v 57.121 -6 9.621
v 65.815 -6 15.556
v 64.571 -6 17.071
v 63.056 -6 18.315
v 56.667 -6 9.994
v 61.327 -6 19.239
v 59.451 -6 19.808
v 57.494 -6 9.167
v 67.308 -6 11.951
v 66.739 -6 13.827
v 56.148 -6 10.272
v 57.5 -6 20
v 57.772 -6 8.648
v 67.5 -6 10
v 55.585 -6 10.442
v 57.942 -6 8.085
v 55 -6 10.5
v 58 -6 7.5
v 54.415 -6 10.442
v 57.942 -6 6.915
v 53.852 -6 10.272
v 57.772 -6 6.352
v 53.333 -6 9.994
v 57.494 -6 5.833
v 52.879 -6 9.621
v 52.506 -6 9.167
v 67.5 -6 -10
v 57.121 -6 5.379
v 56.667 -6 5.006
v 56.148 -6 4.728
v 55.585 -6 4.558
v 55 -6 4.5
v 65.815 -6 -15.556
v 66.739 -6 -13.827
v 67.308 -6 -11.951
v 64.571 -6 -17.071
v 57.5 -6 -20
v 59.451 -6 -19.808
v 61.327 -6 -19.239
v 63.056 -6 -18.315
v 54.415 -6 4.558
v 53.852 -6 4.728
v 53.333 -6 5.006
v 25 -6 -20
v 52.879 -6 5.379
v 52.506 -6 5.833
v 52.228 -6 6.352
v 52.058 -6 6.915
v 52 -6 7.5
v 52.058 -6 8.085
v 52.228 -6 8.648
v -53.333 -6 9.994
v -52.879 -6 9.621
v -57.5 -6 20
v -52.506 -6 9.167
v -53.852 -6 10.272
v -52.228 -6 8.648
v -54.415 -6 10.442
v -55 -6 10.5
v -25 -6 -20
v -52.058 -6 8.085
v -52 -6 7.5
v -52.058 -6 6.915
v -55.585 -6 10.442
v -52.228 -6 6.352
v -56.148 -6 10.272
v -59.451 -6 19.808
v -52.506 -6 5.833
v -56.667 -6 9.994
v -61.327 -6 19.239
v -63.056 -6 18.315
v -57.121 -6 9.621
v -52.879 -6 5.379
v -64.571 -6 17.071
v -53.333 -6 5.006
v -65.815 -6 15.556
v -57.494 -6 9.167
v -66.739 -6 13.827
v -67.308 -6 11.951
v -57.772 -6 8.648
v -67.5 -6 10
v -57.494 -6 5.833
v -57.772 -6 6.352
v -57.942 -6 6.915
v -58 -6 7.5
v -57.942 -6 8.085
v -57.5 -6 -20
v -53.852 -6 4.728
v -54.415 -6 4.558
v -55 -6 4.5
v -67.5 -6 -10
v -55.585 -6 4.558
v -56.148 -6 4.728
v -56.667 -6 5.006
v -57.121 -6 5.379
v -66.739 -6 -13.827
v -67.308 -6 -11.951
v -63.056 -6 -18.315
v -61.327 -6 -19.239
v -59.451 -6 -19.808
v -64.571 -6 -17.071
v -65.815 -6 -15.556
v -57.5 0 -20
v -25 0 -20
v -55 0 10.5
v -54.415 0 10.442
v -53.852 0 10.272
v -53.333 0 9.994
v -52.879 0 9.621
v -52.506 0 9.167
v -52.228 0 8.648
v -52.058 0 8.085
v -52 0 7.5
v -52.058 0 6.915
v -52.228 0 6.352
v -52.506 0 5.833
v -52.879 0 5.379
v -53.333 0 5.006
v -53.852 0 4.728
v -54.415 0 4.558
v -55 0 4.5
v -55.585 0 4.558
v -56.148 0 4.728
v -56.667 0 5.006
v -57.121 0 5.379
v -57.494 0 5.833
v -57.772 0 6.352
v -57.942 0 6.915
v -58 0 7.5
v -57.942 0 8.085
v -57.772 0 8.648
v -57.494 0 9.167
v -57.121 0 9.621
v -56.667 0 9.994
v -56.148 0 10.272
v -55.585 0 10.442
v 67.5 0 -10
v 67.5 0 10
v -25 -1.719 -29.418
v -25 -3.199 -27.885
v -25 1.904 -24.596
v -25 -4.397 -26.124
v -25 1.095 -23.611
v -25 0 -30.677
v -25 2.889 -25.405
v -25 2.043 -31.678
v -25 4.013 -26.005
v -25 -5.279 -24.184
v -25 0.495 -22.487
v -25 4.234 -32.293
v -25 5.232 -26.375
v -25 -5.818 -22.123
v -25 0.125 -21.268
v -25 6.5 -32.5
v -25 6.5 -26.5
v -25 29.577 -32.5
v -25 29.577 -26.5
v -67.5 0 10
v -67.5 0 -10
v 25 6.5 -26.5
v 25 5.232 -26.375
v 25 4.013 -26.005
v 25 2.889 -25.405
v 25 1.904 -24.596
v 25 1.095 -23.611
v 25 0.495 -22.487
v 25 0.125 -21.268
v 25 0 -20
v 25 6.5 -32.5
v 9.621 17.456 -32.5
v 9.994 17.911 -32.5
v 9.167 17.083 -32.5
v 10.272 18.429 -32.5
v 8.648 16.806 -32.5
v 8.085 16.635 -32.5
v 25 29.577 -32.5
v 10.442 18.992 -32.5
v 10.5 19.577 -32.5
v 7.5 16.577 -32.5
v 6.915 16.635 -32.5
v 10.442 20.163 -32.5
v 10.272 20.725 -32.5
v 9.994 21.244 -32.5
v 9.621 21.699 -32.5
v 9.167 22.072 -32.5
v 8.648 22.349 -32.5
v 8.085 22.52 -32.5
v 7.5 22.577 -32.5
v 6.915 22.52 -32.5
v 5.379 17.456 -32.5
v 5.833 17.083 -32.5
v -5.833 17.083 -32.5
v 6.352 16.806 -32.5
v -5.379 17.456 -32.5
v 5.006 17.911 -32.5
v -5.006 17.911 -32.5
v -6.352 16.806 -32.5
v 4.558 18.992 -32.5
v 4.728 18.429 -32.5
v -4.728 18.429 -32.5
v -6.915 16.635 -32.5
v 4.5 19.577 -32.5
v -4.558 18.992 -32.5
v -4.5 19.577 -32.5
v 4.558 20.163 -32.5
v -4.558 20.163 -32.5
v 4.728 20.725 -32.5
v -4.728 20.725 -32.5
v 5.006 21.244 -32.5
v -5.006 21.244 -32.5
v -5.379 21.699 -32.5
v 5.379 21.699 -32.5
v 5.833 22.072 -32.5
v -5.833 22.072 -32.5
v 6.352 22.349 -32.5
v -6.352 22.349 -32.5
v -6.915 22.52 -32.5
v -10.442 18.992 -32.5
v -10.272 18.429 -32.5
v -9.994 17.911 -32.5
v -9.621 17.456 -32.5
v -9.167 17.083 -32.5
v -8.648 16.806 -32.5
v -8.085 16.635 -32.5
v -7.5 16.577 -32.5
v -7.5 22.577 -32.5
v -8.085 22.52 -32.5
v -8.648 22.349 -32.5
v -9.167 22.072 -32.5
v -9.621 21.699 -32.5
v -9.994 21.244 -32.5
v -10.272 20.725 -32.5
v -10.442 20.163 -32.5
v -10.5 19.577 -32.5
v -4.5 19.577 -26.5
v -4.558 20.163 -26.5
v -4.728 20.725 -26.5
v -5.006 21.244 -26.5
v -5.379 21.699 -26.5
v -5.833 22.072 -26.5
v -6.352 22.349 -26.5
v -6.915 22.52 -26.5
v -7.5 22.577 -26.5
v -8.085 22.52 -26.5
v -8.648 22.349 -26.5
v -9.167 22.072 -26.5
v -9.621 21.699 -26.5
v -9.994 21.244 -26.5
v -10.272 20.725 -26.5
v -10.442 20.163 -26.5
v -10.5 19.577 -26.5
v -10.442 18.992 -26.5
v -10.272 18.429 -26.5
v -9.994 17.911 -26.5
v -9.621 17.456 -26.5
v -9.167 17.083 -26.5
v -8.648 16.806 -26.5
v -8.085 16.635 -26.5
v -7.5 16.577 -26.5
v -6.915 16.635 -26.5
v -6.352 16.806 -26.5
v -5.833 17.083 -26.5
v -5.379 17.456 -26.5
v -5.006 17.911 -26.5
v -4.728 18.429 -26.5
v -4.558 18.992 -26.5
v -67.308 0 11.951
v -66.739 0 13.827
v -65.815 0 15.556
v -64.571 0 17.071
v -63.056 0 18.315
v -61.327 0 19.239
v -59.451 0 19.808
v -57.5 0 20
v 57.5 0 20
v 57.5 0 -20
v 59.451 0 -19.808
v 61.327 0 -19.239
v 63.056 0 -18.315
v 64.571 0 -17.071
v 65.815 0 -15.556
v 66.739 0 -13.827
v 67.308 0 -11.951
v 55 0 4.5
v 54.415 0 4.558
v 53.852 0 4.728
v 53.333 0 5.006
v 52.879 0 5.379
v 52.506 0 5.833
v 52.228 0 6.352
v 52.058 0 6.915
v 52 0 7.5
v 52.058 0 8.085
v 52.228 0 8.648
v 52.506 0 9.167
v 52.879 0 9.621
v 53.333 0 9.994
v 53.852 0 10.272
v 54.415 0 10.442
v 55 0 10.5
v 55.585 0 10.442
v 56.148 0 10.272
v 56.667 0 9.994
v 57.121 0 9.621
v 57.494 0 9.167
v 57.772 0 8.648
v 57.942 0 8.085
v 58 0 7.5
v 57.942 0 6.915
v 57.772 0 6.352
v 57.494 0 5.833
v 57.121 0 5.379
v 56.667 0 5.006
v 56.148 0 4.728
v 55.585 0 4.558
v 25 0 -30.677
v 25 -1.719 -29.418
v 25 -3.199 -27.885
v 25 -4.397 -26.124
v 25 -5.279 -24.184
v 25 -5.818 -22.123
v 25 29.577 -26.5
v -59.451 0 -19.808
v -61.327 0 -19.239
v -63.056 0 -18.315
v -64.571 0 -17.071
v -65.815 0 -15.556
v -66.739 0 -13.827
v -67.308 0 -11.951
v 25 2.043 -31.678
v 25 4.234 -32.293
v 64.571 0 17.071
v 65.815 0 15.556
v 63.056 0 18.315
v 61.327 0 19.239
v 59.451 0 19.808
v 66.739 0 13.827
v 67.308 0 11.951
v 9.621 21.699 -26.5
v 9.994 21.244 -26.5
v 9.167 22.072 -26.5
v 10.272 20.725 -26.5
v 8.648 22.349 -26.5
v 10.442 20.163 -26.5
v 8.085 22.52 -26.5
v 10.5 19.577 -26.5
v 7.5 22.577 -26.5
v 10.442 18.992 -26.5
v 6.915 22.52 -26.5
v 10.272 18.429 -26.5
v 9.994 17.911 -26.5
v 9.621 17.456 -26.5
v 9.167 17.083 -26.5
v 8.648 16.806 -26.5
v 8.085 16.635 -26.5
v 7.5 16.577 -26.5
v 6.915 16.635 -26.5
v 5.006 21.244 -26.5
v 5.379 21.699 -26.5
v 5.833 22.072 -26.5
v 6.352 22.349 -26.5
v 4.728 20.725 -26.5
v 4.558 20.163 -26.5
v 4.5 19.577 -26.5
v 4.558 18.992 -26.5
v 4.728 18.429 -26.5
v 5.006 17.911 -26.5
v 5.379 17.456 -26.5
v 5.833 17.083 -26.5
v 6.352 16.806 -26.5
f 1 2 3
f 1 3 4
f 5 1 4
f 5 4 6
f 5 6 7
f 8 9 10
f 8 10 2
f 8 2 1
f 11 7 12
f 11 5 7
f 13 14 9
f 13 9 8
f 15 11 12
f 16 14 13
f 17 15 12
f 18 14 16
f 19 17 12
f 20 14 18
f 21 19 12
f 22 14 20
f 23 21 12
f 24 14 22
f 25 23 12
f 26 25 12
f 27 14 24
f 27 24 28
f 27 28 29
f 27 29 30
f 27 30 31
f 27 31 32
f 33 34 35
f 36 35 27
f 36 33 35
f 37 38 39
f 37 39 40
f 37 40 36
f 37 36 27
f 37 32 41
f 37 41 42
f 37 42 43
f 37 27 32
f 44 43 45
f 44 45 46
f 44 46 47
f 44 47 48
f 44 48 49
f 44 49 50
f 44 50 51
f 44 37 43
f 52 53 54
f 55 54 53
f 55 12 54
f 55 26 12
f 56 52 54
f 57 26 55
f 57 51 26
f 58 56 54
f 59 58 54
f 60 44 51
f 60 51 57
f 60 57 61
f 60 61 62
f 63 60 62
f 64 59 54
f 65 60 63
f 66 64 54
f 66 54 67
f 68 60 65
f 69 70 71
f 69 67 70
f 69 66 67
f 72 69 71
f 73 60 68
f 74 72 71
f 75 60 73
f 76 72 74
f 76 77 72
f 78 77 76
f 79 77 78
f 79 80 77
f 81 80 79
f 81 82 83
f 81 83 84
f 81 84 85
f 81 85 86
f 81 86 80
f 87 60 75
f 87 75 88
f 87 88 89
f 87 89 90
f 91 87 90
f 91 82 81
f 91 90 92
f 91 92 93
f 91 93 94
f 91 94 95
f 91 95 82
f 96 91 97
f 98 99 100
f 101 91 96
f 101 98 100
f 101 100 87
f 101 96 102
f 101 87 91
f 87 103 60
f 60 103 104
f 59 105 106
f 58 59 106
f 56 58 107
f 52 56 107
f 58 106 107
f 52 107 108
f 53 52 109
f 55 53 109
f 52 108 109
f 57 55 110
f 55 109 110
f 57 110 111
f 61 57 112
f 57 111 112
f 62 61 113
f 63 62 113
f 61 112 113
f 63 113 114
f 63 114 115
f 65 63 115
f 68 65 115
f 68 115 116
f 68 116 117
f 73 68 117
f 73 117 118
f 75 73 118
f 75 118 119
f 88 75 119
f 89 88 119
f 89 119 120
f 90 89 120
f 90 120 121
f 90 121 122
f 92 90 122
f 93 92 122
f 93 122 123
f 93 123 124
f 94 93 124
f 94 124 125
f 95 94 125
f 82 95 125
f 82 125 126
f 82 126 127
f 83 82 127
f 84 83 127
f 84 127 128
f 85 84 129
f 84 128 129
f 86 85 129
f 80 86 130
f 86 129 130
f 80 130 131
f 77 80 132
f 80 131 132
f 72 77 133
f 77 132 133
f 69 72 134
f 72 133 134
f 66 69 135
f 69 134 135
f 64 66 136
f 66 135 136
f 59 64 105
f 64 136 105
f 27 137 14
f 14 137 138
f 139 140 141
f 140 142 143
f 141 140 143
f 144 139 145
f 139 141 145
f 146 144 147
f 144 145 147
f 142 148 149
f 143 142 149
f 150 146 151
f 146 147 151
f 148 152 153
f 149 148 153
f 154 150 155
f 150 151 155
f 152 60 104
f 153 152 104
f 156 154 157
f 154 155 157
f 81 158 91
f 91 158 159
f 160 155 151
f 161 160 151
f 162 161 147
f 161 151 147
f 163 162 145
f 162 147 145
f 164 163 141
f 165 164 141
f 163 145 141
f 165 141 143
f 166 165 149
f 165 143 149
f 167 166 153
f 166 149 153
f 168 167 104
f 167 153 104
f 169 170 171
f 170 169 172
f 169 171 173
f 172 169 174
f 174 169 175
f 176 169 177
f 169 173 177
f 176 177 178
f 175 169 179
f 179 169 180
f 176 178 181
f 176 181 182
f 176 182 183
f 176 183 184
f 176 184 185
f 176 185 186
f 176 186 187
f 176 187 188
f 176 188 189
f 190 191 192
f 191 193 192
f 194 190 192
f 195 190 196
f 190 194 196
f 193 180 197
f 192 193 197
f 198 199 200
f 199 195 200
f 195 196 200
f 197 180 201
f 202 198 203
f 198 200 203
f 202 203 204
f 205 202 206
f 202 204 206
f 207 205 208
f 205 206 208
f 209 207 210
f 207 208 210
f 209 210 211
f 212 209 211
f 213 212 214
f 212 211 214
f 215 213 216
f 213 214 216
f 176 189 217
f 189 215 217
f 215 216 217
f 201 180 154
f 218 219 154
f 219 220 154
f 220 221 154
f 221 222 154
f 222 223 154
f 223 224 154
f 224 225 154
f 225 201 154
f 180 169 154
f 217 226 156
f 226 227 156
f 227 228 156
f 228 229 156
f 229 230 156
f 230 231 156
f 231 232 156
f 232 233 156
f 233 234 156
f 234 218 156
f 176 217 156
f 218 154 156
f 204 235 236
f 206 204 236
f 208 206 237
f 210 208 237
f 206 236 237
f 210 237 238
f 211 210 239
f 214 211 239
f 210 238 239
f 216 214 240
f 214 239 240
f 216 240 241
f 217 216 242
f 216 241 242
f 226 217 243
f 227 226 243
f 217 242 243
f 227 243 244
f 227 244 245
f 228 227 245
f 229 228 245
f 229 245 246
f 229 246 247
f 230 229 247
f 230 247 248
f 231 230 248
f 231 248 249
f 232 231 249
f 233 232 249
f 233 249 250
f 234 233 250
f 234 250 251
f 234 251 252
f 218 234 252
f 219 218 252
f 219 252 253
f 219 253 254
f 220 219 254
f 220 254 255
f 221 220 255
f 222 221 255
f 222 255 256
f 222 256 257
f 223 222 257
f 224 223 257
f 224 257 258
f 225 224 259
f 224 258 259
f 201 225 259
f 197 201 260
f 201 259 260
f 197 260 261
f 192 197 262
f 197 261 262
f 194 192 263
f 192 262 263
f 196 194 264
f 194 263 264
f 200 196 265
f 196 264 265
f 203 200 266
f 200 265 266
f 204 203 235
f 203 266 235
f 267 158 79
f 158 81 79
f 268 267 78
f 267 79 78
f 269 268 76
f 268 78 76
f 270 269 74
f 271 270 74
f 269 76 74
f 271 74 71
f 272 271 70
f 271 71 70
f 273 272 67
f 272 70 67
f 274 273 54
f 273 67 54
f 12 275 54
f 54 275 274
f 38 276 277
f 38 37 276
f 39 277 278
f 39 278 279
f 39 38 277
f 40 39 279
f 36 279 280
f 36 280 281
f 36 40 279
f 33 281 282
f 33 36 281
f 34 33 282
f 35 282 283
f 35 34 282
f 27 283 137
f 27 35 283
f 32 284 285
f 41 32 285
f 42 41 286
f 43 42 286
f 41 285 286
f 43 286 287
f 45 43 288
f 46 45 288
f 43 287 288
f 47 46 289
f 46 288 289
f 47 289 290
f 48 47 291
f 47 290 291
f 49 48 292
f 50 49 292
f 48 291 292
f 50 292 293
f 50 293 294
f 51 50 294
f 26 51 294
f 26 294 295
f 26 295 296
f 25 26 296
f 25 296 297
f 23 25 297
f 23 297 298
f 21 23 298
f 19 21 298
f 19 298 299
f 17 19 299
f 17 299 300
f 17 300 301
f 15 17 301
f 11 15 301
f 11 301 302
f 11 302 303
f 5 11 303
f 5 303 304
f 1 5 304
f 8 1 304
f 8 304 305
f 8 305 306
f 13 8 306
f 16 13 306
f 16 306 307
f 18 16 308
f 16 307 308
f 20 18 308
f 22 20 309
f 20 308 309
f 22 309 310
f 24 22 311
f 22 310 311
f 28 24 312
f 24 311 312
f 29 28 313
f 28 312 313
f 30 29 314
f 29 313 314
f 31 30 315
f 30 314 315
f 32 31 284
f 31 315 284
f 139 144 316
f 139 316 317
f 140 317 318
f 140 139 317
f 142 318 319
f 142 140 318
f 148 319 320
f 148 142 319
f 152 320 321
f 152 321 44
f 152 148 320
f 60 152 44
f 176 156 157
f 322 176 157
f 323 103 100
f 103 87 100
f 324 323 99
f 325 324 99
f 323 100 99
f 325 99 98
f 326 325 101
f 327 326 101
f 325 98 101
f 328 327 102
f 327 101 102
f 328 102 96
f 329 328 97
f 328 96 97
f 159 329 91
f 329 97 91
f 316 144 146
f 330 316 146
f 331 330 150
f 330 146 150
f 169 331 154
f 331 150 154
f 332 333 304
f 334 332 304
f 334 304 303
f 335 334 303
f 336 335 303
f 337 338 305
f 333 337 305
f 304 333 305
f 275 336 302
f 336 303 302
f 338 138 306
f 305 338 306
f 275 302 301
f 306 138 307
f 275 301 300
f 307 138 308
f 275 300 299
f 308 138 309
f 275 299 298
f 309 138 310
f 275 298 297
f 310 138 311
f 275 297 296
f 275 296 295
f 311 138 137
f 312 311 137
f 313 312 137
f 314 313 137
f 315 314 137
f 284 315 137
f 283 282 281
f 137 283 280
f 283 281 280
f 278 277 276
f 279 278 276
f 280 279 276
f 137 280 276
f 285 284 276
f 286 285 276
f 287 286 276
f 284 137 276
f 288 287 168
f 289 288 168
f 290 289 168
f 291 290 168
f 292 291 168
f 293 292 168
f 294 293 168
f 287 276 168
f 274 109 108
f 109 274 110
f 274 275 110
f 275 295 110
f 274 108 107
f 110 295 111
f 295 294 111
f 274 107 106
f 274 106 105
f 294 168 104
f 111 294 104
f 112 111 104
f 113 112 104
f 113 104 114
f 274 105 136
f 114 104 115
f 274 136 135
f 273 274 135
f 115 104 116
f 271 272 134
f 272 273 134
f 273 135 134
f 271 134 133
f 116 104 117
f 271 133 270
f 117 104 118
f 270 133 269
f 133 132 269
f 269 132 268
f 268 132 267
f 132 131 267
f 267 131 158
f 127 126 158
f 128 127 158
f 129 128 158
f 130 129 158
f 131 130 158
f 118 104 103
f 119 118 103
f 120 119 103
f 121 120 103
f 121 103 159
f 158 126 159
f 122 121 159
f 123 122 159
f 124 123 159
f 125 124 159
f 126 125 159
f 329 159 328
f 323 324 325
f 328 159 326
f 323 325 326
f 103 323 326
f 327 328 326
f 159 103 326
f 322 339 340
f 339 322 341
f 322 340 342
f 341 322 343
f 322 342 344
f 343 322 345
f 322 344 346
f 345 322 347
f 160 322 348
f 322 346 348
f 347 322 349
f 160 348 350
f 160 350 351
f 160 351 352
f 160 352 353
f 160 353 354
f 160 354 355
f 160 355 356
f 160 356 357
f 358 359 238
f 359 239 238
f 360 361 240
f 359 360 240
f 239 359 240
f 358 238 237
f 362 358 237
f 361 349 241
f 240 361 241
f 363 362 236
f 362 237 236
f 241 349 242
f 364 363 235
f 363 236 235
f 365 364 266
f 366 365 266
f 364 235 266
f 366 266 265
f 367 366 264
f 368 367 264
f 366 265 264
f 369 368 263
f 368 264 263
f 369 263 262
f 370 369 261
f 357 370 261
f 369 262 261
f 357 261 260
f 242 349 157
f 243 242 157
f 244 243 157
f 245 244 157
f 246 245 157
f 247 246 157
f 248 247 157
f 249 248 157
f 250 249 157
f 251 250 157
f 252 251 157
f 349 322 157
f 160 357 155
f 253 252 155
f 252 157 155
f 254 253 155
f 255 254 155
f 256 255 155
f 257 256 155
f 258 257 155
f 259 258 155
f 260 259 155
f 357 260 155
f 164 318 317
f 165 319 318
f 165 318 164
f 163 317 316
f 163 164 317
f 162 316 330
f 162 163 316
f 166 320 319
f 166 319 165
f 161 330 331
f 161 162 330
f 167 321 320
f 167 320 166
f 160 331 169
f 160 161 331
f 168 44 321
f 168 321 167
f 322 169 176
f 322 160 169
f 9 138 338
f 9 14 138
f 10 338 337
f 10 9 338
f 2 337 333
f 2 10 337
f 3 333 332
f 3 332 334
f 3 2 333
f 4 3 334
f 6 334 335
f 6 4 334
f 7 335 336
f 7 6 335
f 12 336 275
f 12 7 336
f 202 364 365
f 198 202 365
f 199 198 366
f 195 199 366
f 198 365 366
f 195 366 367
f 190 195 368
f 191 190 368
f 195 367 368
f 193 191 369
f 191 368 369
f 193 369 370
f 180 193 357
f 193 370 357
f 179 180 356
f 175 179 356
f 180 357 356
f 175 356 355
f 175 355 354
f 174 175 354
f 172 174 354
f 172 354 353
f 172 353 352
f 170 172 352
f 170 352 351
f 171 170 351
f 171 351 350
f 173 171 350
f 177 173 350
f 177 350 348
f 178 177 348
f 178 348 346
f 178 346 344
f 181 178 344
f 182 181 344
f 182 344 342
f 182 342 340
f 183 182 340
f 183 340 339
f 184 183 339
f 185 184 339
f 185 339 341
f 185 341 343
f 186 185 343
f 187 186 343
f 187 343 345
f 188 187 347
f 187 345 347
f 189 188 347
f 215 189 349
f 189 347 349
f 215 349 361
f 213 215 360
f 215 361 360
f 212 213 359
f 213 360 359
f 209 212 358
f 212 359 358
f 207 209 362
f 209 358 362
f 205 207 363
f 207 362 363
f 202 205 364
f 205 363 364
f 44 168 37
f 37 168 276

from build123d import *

# Parameters (mm, degrees)
BASE_FLANGE1_DEPTH     = 6
SKETCHED_START         = -25
SKETCHED_BEND1_DEPTH   = 50
SKETCHED_BEND1_2_DEPTH = 50
SKETCH8_R              = 3
CUT_EXTRUDE1_DEPTH     = 81.54392997
FILLET1_R              = 10
SKETCH10_R             = 3
CUT_EXTRUDE2_DEPTH     = 88.139684731


# Read off the part's stored shape, not the designer's step: Sketched Bend1
# Sheet-metal steps are written as plain solids
with BuildPart() as part:
    # Sketch1 → Base-Flange1 (new body)
    with BuildSketch(Plane(origin=(0, 0, 0), x_dir=(1, 0, 0), z_dir=(0, 1, 0))):
        Polygon((25, 20), (67.5, 20), (67.5, -20), (-67.5, -20), (-67.5, 20), (-25, 20), (-25, 58), (25, 58), align=None)
    extrude(amount=-BASE_FLANGE1_DEPTH)

    # Sketched Bend1 outline → Sketched Bend1 (cut)
    with BuildSketch(Plane.YZ.offset(SKETCHED_START)):
        with BuildLine():
            Line((0, -58), (0, -30.677078252))
            ThreePointArc((0, -30.677078252), (-4.397247359, -26.123724357), (-6, -20))
            Line((-6, -20), (-6, -58))
            Line((-6, -58), (0, -58))
        make_face()
    extrude(amount=SKETCHED_BEND1_DEPTH, mode=Mode.SUBTRACT)

    # Sketched Bend1 2 outline → Sketched Bend1 2 (add)
    with BuildSketch(Plane.YZ.offset(SKETCHED_START)):
        with BuildLine():
            Line((6.5, -32.5), (29.577434895, -32.5))
            Line((29.577434895, -32.5), (29.577434895, -26.5))
            Line((29.577434895, -26.5), (6.5, -26.5))
            ThreePointArc((6.5, -26.5), (1.903805922, -24.596194078), (0, -20))
            Line((0, -20), (0, -30.677078252))
            ThreePointArc((0, -30.677078252), (3.124609515, -32.035644523), (6.5, -32.5))
        make_face()
    extrude(amount=SKETCHED_BEND1_2_DEPTH)

    # Sketch8 → Cut-Extrude1 (cut, through all)
    with BuildSketch(Plane(origin=(0, 0, 0), x_dir=(1, 0, 0), z_dir=(0, 1, 0))):
        with Locations(Location((-55, -7.5, 0), (0, 0, 270))):
            Circle(SKETCH8_R)
        with Locations(Location((55, -7.5, 0), (0, 0, 90))):
            Circle(SKETCH8_R)
    extrude(amount=-CUT_EXTRUDE1_DEPTH, mode=Mode.SUBTRACT)

    # Fillet1
    fillet1_edges = [part.edges().sort_by_distance(p)[0] for p in [
        (-67.5, -3, 20),
        (67.5, -3, 20),
        (67.5, -3, -20),
        (-67.5, -3, -20),
    ]]
    fillet(fillet1_edges, radius=FILLET1_R)

    # Sketch10 → Cut-Extrude2 (cut, through all)
    with BuildSketch(Plane.XY.offset(-26.5)):
        with Locations((-7.5, 19.577434895)):
            Circle(SKETCH10_R)
        with Locations(Location((7.5, 19.577434895, 0), (0, 0, 180))):
            Circle(SKETCH10_R)
    extrude(amount=-CUT_EXTRUDE2_DEPTH, mode=Mode.SUBTRACT)


solid = part.part
